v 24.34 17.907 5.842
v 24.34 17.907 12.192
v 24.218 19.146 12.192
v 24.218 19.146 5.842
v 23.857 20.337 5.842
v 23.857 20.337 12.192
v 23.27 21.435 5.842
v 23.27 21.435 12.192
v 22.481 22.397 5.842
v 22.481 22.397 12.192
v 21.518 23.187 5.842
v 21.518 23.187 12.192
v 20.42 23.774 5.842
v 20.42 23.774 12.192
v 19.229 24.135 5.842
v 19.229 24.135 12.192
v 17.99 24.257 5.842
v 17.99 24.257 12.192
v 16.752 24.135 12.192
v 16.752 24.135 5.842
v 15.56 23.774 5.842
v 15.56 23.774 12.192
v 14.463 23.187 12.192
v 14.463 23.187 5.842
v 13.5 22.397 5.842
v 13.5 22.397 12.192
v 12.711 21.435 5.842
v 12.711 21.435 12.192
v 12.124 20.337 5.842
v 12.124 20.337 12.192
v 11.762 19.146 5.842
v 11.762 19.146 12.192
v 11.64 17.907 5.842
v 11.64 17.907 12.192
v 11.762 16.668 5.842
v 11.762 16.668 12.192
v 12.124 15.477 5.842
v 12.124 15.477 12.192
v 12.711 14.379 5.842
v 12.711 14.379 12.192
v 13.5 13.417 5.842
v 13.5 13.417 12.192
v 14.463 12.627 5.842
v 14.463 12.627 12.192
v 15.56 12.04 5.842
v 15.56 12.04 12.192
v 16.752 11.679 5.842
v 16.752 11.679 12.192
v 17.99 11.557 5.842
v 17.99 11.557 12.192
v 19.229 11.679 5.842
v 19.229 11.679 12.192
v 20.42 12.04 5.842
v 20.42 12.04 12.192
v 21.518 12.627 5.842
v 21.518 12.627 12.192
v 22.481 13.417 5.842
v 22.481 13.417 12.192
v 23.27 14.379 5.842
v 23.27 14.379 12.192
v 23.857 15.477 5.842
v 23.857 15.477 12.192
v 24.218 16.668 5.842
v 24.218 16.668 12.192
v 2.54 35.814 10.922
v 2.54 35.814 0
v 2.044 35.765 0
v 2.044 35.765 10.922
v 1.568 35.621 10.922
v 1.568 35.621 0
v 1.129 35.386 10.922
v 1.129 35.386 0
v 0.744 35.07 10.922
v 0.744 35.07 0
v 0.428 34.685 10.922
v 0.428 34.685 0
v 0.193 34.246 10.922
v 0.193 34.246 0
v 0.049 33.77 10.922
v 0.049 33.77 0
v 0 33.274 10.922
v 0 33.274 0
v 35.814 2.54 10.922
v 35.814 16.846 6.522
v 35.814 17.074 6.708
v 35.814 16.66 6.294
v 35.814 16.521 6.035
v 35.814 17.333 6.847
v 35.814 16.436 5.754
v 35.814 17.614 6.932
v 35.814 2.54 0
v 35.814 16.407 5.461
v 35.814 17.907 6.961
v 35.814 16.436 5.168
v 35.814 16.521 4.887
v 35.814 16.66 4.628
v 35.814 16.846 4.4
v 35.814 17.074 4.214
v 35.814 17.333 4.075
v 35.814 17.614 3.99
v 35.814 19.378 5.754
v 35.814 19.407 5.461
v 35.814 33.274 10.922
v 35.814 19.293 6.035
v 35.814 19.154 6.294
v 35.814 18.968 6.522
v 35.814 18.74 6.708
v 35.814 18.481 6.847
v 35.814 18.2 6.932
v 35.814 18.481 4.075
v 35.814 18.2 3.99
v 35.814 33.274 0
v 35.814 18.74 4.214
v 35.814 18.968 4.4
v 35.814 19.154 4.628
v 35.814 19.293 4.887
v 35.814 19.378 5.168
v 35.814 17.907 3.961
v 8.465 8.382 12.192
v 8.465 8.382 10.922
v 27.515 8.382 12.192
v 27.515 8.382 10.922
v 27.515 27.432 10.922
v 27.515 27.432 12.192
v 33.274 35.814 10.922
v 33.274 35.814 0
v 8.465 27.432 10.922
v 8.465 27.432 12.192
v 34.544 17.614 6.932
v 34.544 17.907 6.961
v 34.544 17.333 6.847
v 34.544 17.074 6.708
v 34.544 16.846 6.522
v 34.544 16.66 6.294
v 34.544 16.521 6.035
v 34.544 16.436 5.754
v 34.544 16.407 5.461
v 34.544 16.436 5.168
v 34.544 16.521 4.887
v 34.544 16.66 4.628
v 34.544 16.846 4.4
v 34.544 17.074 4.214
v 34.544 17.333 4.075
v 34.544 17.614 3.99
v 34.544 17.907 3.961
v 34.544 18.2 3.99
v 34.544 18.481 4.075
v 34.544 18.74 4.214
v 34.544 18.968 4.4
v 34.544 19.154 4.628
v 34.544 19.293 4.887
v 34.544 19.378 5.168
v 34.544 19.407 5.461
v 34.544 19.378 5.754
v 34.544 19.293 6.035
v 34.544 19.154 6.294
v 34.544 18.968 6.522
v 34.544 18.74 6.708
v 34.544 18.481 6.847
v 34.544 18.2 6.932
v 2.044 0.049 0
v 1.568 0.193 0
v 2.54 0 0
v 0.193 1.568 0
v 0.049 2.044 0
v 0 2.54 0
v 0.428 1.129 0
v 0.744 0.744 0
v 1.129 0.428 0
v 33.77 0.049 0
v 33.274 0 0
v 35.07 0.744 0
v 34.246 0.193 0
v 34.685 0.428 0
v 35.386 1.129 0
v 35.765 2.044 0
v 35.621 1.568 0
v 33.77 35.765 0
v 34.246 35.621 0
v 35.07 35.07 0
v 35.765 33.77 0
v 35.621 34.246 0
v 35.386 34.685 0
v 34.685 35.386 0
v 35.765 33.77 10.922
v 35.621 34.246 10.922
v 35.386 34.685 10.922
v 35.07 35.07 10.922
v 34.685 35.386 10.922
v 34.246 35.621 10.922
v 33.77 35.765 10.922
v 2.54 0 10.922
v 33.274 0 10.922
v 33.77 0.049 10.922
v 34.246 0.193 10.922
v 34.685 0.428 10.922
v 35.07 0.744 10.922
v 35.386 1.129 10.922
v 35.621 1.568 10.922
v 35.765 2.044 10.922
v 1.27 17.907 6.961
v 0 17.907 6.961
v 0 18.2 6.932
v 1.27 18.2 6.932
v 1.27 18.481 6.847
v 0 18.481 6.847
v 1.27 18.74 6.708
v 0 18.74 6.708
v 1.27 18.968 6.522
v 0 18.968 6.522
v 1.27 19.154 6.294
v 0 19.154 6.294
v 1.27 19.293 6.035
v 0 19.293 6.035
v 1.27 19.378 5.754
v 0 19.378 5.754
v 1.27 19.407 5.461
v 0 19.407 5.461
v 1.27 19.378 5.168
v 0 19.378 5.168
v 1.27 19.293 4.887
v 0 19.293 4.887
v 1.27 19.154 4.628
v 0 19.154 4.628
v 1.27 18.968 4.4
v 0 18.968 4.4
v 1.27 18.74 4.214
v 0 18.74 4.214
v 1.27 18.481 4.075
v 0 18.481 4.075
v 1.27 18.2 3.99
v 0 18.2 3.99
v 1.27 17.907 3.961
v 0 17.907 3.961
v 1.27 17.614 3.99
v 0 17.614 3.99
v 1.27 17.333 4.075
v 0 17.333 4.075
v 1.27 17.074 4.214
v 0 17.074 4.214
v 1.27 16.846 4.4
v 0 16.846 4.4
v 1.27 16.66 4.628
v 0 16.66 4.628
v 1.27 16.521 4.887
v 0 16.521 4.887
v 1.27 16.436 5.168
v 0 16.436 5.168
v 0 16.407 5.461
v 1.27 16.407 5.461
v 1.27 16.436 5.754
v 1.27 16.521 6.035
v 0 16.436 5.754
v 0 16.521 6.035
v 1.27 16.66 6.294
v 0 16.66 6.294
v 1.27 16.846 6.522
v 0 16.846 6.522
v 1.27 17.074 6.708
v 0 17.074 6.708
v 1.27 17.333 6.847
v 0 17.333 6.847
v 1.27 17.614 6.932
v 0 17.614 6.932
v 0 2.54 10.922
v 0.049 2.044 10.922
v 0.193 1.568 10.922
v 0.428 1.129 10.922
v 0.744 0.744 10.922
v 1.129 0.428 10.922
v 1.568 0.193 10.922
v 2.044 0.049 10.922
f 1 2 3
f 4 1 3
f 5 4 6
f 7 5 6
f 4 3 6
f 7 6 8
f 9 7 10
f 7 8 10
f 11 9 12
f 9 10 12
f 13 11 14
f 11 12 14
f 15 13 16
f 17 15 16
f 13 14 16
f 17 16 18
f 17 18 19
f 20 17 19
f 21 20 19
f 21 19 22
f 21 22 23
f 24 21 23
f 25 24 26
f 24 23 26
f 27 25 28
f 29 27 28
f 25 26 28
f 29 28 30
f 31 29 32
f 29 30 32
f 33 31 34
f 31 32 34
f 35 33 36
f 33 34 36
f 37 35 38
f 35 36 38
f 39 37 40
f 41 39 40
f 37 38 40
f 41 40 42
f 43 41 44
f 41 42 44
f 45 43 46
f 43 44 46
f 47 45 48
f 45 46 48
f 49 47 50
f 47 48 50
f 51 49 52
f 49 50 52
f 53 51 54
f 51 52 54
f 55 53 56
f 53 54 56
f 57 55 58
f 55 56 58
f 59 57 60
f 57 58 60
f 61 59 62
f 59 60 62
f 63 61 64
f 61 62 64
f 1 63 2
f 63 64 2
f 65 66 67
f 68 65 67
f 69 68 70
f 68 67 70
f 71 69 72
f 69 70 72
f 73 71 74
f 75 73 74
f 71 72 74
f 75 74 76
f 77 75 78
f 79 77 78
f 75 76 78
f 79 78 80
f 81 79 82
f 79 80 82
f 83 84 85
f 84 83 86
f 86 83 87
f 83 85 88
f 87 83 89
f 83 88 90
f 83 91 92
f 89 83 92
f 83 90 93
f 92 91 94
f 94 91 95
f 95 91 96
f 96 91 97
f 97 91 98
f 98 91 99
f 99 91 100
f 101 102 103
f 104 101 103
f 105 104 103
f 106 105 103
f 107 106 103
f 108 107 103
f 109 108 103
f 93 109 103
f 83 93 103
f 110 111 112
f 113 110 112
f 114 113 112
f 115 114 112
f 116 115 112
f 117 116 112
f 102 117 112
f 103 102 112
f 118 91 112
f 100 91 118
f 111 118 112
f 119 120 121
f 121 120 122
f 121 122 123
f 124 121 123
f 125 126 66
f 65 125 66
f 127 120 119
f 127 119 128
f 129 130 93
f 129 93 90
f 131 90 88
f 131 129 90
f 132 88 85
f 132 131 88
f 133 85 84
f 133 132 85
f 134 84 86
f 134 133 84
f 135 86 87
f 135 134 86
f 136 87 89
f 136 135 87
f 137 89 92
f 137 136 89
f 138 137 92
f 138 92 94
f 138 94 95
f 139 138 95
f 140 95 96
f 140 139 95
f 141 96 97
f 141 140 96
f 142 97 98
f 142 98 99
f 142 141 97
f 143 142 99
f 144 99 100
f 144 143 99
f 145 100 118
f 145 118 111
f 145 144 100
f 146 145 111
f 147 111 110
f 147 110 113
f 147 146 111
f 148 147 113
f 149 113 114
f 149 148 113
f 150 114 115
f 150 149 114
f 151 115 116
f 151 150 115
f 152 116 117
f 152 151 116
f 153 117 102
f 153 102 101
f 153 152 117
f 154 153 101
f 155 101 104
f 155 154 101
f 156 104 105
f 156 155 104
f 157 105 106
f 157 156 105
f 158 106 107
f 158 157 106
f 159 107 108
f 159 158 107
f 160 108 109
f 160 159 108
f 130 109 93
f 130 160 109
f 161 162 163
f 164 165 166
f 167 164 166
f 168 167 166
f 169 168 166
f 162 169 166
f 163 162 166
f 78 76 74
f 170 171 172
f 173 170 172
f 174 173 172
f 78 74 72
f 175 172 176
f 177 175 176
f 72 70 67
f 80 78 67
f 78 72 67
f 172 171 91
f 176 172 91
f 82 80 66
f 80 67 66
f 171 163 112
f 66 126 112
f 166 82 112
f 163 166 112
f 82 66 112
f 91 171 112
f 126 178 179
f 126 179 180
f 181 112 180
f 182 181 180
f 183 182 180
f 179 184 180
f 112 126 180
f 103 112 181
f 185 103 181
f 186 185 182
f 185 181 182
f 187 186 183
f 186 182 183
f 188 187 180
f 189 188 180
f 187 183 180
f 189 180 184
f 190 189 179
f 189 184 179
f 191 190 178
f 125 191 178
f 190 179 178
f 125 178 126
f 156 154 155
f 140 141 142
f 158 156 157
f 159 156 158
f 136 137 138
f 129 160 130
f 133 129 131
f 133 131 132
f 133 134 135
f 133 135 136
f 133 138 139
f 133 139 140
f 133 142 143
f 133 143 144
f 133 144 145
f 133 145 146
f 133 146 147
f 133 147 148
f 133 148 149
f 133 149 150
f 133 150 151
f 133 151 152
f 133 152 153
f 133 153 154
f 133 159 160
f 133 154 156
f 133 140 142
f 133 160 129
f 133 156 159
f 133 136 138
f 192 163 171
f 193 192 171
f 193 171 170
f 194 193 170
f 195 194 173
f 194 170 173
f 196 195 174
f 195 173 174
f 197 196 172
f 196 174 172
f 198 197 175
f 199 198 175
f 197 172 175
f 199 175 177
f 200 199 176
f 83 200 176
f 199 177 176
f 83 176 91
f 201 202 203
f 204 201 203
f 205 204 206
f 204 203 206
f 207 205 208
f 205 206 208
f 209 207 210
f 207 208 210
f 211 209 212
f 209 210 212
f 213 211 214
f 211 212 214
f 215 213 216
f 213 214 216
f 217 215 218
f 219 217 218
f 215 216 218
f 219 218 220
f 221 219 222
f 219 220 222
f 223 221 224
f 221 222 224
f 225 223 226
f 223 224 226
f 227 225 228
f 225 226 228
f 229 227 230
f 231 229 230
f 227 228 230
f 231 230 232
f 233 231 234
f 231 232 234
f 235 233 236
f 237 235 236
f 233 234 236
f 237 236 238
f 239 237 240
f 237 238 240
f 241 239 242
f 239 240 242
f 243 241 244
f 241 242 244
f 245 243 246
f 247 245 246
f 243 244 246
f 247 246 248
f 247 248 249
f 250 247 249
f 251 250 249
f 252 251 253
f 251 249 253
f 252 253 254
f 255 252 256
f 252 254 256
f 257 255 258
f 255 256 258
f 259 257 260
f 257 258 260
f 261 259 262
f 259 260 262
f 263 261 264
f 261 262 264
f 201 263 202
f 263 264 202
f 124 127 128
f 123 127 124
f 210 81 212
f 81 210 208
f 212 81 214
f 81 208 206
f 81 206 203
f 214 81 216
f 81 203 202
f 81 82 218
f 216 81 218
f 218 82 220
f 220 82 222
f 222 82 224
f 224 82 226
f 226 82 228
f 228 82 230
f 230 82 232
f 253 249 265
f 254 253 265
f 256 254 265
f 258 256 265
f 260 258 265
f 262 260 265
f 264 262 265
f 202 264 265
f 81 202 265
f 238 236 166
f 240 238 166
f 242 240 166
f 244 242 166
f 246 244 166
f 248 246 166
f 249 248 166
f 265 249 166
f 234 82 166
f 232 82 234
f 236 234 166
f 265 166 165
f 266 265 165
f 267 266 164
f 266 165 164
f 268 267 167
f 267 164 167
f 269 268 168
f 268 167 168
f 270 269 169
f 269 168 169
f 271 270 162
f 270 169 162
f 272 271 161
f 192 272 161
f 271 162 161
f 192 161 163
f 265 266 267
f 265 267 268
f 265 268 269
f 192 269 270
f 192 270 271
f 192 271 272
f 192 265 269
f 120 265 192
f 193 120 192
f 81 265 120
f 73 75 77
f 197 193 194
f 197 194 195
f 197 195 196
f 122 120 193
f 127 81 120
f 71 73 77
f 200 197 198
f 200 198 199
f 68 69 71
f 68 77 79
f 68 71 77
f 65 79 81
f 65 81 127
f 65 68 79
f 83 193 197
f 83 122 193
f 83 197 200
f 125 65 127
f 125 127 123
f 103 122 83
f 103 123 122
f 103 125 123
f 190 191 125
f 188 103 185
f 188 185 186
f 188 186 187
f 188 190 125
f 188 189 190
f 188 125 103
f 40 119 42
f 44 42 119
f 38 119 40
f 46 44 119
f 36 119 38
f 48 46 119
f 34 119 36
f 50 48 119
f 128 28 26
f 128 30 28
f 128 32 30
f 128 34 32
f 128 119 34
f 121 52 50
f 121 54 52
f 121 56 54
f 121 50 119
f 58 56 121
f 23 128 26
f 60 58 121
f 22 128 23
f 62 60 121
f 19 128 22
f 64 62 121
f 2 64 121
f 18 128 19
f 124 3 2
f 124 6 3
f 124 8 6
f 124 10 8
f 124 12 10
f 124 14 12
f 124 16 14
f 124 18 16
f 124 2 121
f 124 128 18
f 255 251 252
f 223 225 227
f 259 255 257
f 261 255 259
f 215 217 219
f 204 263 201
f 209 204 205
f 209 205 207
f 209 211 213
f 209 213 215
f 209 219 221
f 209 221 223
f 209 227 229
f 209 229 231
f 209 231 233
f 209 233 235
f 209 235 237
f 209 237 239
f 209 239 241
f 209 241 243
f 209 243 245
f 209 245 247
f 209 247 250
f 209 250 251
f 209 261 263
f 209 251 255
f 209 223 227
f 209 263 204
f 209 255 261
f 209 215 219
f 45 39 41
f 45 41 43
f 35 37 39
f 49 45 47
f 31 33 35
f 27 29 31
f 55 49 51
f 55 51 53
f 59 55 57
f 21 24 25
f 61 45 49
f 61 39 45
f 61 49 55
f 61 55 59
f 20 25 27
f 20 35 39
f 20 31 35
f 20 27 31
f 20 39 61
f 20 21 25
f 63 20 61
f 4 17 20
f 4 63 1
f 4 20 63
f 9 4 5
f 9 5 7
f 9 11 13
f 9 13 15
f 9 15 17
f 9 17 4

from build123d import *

# Parameters (mm, degrees)
BOSS_EXTRUDE1_DEPTH = 10.922
SKETCH2_W           = 19.05
SKETCH2_H           = 19.05
BOSS_EXTRUDE2_DEPTH = 1.27
SKETCH3_R           = 6.35
CUT_EXTRUDE1_DEPTH  = 6.35
SKETCH4_R           = 1.500000048
CUT_EXTRUDE2_DEPTH  = 1.27
CUT_EXTRUDE3_START  = -1.27
SKETCH5_R           = 1.500000048
CUT_EXTRUDE3_DEPTH  = 1.27


with BuildPart() as part:
    # Sketch1 → Boss-Extrude1 (new body)
    with BuildSketch(Plane.XY):
        with BuildLine():
            Line((2.54, 0), (33.274, 0))
            ThreePointArc((33.274, 0), (35.070051224, 0.743948776), (35.814, 2.54))
            Line((35.814, 2.54), (35.814, 33.274))
            ThreePointArc((35.814, 33.274), (35.070051224, 35.070051224), (33.274, 35.814))
            Line((33.274, 35.814), (2.54, 35.814))
            ThreePointArc((2.54, 35.814), (0.743948776, 35.070051224), (0, 33.274))
            Line((0, 33.274), (0, 2.54))
            ThreePointArc((0, 2.54), (0.743948776, 0.743948776), (2.54, 0))
        make_face()
    extrude(amount=BOSS_EXTRUDE1_DEPTH)

    # Sketch2 → Boss-Extrude2 (add)
    with BuildSketch(Plane.XY.offset(10.922)):
        with Locations((17.990434567, 17.907)):
            Rectangle(SKETCH2_W, SKETCH2_H)
    extrude(amount=BOSS_EXTRUDE2_DEPTH)

    # Sketch3 → Cut-Extrude1 (cut)
    with BuildSketch(Plane.XY.offset(12.192)):
        with Locations((17.990434567, 17.907)):
            Circle(SKETCH3_R)
    extrude(amount=-CUT_EXTRUDE1_DEPTH, mode=Mode.SUBTRACT)

    # Sketch4 → Cut-Extrude2 (cut)
    with BuildSketch(Plane.ZY):
        with Locations((5.461, 17.907)):
            Circle(SKETCH4_R)
    extrude(amount=-CUT_EXTRUDE2_DEPTH, mode=Mode.SUBTRACT)

    # Sketch5 → Cut-Extrude3 (cut)
    with BuildSketch(Plane(origin=(35.814, 0, 0), x_dir=(0, 0, -1), z_dir=(1, 0, 0)).offset(CUT_EXTRUDE3_START)):
        with Locations(Location((-5.461, 17.907, 0), (0, 0, 180))):
            Circle(SKETCH5_R)
    extrude(amount=CUT_EXTRUDE3_DEPTH, mode=Mode.SUBTRACT)


solid = part.part
